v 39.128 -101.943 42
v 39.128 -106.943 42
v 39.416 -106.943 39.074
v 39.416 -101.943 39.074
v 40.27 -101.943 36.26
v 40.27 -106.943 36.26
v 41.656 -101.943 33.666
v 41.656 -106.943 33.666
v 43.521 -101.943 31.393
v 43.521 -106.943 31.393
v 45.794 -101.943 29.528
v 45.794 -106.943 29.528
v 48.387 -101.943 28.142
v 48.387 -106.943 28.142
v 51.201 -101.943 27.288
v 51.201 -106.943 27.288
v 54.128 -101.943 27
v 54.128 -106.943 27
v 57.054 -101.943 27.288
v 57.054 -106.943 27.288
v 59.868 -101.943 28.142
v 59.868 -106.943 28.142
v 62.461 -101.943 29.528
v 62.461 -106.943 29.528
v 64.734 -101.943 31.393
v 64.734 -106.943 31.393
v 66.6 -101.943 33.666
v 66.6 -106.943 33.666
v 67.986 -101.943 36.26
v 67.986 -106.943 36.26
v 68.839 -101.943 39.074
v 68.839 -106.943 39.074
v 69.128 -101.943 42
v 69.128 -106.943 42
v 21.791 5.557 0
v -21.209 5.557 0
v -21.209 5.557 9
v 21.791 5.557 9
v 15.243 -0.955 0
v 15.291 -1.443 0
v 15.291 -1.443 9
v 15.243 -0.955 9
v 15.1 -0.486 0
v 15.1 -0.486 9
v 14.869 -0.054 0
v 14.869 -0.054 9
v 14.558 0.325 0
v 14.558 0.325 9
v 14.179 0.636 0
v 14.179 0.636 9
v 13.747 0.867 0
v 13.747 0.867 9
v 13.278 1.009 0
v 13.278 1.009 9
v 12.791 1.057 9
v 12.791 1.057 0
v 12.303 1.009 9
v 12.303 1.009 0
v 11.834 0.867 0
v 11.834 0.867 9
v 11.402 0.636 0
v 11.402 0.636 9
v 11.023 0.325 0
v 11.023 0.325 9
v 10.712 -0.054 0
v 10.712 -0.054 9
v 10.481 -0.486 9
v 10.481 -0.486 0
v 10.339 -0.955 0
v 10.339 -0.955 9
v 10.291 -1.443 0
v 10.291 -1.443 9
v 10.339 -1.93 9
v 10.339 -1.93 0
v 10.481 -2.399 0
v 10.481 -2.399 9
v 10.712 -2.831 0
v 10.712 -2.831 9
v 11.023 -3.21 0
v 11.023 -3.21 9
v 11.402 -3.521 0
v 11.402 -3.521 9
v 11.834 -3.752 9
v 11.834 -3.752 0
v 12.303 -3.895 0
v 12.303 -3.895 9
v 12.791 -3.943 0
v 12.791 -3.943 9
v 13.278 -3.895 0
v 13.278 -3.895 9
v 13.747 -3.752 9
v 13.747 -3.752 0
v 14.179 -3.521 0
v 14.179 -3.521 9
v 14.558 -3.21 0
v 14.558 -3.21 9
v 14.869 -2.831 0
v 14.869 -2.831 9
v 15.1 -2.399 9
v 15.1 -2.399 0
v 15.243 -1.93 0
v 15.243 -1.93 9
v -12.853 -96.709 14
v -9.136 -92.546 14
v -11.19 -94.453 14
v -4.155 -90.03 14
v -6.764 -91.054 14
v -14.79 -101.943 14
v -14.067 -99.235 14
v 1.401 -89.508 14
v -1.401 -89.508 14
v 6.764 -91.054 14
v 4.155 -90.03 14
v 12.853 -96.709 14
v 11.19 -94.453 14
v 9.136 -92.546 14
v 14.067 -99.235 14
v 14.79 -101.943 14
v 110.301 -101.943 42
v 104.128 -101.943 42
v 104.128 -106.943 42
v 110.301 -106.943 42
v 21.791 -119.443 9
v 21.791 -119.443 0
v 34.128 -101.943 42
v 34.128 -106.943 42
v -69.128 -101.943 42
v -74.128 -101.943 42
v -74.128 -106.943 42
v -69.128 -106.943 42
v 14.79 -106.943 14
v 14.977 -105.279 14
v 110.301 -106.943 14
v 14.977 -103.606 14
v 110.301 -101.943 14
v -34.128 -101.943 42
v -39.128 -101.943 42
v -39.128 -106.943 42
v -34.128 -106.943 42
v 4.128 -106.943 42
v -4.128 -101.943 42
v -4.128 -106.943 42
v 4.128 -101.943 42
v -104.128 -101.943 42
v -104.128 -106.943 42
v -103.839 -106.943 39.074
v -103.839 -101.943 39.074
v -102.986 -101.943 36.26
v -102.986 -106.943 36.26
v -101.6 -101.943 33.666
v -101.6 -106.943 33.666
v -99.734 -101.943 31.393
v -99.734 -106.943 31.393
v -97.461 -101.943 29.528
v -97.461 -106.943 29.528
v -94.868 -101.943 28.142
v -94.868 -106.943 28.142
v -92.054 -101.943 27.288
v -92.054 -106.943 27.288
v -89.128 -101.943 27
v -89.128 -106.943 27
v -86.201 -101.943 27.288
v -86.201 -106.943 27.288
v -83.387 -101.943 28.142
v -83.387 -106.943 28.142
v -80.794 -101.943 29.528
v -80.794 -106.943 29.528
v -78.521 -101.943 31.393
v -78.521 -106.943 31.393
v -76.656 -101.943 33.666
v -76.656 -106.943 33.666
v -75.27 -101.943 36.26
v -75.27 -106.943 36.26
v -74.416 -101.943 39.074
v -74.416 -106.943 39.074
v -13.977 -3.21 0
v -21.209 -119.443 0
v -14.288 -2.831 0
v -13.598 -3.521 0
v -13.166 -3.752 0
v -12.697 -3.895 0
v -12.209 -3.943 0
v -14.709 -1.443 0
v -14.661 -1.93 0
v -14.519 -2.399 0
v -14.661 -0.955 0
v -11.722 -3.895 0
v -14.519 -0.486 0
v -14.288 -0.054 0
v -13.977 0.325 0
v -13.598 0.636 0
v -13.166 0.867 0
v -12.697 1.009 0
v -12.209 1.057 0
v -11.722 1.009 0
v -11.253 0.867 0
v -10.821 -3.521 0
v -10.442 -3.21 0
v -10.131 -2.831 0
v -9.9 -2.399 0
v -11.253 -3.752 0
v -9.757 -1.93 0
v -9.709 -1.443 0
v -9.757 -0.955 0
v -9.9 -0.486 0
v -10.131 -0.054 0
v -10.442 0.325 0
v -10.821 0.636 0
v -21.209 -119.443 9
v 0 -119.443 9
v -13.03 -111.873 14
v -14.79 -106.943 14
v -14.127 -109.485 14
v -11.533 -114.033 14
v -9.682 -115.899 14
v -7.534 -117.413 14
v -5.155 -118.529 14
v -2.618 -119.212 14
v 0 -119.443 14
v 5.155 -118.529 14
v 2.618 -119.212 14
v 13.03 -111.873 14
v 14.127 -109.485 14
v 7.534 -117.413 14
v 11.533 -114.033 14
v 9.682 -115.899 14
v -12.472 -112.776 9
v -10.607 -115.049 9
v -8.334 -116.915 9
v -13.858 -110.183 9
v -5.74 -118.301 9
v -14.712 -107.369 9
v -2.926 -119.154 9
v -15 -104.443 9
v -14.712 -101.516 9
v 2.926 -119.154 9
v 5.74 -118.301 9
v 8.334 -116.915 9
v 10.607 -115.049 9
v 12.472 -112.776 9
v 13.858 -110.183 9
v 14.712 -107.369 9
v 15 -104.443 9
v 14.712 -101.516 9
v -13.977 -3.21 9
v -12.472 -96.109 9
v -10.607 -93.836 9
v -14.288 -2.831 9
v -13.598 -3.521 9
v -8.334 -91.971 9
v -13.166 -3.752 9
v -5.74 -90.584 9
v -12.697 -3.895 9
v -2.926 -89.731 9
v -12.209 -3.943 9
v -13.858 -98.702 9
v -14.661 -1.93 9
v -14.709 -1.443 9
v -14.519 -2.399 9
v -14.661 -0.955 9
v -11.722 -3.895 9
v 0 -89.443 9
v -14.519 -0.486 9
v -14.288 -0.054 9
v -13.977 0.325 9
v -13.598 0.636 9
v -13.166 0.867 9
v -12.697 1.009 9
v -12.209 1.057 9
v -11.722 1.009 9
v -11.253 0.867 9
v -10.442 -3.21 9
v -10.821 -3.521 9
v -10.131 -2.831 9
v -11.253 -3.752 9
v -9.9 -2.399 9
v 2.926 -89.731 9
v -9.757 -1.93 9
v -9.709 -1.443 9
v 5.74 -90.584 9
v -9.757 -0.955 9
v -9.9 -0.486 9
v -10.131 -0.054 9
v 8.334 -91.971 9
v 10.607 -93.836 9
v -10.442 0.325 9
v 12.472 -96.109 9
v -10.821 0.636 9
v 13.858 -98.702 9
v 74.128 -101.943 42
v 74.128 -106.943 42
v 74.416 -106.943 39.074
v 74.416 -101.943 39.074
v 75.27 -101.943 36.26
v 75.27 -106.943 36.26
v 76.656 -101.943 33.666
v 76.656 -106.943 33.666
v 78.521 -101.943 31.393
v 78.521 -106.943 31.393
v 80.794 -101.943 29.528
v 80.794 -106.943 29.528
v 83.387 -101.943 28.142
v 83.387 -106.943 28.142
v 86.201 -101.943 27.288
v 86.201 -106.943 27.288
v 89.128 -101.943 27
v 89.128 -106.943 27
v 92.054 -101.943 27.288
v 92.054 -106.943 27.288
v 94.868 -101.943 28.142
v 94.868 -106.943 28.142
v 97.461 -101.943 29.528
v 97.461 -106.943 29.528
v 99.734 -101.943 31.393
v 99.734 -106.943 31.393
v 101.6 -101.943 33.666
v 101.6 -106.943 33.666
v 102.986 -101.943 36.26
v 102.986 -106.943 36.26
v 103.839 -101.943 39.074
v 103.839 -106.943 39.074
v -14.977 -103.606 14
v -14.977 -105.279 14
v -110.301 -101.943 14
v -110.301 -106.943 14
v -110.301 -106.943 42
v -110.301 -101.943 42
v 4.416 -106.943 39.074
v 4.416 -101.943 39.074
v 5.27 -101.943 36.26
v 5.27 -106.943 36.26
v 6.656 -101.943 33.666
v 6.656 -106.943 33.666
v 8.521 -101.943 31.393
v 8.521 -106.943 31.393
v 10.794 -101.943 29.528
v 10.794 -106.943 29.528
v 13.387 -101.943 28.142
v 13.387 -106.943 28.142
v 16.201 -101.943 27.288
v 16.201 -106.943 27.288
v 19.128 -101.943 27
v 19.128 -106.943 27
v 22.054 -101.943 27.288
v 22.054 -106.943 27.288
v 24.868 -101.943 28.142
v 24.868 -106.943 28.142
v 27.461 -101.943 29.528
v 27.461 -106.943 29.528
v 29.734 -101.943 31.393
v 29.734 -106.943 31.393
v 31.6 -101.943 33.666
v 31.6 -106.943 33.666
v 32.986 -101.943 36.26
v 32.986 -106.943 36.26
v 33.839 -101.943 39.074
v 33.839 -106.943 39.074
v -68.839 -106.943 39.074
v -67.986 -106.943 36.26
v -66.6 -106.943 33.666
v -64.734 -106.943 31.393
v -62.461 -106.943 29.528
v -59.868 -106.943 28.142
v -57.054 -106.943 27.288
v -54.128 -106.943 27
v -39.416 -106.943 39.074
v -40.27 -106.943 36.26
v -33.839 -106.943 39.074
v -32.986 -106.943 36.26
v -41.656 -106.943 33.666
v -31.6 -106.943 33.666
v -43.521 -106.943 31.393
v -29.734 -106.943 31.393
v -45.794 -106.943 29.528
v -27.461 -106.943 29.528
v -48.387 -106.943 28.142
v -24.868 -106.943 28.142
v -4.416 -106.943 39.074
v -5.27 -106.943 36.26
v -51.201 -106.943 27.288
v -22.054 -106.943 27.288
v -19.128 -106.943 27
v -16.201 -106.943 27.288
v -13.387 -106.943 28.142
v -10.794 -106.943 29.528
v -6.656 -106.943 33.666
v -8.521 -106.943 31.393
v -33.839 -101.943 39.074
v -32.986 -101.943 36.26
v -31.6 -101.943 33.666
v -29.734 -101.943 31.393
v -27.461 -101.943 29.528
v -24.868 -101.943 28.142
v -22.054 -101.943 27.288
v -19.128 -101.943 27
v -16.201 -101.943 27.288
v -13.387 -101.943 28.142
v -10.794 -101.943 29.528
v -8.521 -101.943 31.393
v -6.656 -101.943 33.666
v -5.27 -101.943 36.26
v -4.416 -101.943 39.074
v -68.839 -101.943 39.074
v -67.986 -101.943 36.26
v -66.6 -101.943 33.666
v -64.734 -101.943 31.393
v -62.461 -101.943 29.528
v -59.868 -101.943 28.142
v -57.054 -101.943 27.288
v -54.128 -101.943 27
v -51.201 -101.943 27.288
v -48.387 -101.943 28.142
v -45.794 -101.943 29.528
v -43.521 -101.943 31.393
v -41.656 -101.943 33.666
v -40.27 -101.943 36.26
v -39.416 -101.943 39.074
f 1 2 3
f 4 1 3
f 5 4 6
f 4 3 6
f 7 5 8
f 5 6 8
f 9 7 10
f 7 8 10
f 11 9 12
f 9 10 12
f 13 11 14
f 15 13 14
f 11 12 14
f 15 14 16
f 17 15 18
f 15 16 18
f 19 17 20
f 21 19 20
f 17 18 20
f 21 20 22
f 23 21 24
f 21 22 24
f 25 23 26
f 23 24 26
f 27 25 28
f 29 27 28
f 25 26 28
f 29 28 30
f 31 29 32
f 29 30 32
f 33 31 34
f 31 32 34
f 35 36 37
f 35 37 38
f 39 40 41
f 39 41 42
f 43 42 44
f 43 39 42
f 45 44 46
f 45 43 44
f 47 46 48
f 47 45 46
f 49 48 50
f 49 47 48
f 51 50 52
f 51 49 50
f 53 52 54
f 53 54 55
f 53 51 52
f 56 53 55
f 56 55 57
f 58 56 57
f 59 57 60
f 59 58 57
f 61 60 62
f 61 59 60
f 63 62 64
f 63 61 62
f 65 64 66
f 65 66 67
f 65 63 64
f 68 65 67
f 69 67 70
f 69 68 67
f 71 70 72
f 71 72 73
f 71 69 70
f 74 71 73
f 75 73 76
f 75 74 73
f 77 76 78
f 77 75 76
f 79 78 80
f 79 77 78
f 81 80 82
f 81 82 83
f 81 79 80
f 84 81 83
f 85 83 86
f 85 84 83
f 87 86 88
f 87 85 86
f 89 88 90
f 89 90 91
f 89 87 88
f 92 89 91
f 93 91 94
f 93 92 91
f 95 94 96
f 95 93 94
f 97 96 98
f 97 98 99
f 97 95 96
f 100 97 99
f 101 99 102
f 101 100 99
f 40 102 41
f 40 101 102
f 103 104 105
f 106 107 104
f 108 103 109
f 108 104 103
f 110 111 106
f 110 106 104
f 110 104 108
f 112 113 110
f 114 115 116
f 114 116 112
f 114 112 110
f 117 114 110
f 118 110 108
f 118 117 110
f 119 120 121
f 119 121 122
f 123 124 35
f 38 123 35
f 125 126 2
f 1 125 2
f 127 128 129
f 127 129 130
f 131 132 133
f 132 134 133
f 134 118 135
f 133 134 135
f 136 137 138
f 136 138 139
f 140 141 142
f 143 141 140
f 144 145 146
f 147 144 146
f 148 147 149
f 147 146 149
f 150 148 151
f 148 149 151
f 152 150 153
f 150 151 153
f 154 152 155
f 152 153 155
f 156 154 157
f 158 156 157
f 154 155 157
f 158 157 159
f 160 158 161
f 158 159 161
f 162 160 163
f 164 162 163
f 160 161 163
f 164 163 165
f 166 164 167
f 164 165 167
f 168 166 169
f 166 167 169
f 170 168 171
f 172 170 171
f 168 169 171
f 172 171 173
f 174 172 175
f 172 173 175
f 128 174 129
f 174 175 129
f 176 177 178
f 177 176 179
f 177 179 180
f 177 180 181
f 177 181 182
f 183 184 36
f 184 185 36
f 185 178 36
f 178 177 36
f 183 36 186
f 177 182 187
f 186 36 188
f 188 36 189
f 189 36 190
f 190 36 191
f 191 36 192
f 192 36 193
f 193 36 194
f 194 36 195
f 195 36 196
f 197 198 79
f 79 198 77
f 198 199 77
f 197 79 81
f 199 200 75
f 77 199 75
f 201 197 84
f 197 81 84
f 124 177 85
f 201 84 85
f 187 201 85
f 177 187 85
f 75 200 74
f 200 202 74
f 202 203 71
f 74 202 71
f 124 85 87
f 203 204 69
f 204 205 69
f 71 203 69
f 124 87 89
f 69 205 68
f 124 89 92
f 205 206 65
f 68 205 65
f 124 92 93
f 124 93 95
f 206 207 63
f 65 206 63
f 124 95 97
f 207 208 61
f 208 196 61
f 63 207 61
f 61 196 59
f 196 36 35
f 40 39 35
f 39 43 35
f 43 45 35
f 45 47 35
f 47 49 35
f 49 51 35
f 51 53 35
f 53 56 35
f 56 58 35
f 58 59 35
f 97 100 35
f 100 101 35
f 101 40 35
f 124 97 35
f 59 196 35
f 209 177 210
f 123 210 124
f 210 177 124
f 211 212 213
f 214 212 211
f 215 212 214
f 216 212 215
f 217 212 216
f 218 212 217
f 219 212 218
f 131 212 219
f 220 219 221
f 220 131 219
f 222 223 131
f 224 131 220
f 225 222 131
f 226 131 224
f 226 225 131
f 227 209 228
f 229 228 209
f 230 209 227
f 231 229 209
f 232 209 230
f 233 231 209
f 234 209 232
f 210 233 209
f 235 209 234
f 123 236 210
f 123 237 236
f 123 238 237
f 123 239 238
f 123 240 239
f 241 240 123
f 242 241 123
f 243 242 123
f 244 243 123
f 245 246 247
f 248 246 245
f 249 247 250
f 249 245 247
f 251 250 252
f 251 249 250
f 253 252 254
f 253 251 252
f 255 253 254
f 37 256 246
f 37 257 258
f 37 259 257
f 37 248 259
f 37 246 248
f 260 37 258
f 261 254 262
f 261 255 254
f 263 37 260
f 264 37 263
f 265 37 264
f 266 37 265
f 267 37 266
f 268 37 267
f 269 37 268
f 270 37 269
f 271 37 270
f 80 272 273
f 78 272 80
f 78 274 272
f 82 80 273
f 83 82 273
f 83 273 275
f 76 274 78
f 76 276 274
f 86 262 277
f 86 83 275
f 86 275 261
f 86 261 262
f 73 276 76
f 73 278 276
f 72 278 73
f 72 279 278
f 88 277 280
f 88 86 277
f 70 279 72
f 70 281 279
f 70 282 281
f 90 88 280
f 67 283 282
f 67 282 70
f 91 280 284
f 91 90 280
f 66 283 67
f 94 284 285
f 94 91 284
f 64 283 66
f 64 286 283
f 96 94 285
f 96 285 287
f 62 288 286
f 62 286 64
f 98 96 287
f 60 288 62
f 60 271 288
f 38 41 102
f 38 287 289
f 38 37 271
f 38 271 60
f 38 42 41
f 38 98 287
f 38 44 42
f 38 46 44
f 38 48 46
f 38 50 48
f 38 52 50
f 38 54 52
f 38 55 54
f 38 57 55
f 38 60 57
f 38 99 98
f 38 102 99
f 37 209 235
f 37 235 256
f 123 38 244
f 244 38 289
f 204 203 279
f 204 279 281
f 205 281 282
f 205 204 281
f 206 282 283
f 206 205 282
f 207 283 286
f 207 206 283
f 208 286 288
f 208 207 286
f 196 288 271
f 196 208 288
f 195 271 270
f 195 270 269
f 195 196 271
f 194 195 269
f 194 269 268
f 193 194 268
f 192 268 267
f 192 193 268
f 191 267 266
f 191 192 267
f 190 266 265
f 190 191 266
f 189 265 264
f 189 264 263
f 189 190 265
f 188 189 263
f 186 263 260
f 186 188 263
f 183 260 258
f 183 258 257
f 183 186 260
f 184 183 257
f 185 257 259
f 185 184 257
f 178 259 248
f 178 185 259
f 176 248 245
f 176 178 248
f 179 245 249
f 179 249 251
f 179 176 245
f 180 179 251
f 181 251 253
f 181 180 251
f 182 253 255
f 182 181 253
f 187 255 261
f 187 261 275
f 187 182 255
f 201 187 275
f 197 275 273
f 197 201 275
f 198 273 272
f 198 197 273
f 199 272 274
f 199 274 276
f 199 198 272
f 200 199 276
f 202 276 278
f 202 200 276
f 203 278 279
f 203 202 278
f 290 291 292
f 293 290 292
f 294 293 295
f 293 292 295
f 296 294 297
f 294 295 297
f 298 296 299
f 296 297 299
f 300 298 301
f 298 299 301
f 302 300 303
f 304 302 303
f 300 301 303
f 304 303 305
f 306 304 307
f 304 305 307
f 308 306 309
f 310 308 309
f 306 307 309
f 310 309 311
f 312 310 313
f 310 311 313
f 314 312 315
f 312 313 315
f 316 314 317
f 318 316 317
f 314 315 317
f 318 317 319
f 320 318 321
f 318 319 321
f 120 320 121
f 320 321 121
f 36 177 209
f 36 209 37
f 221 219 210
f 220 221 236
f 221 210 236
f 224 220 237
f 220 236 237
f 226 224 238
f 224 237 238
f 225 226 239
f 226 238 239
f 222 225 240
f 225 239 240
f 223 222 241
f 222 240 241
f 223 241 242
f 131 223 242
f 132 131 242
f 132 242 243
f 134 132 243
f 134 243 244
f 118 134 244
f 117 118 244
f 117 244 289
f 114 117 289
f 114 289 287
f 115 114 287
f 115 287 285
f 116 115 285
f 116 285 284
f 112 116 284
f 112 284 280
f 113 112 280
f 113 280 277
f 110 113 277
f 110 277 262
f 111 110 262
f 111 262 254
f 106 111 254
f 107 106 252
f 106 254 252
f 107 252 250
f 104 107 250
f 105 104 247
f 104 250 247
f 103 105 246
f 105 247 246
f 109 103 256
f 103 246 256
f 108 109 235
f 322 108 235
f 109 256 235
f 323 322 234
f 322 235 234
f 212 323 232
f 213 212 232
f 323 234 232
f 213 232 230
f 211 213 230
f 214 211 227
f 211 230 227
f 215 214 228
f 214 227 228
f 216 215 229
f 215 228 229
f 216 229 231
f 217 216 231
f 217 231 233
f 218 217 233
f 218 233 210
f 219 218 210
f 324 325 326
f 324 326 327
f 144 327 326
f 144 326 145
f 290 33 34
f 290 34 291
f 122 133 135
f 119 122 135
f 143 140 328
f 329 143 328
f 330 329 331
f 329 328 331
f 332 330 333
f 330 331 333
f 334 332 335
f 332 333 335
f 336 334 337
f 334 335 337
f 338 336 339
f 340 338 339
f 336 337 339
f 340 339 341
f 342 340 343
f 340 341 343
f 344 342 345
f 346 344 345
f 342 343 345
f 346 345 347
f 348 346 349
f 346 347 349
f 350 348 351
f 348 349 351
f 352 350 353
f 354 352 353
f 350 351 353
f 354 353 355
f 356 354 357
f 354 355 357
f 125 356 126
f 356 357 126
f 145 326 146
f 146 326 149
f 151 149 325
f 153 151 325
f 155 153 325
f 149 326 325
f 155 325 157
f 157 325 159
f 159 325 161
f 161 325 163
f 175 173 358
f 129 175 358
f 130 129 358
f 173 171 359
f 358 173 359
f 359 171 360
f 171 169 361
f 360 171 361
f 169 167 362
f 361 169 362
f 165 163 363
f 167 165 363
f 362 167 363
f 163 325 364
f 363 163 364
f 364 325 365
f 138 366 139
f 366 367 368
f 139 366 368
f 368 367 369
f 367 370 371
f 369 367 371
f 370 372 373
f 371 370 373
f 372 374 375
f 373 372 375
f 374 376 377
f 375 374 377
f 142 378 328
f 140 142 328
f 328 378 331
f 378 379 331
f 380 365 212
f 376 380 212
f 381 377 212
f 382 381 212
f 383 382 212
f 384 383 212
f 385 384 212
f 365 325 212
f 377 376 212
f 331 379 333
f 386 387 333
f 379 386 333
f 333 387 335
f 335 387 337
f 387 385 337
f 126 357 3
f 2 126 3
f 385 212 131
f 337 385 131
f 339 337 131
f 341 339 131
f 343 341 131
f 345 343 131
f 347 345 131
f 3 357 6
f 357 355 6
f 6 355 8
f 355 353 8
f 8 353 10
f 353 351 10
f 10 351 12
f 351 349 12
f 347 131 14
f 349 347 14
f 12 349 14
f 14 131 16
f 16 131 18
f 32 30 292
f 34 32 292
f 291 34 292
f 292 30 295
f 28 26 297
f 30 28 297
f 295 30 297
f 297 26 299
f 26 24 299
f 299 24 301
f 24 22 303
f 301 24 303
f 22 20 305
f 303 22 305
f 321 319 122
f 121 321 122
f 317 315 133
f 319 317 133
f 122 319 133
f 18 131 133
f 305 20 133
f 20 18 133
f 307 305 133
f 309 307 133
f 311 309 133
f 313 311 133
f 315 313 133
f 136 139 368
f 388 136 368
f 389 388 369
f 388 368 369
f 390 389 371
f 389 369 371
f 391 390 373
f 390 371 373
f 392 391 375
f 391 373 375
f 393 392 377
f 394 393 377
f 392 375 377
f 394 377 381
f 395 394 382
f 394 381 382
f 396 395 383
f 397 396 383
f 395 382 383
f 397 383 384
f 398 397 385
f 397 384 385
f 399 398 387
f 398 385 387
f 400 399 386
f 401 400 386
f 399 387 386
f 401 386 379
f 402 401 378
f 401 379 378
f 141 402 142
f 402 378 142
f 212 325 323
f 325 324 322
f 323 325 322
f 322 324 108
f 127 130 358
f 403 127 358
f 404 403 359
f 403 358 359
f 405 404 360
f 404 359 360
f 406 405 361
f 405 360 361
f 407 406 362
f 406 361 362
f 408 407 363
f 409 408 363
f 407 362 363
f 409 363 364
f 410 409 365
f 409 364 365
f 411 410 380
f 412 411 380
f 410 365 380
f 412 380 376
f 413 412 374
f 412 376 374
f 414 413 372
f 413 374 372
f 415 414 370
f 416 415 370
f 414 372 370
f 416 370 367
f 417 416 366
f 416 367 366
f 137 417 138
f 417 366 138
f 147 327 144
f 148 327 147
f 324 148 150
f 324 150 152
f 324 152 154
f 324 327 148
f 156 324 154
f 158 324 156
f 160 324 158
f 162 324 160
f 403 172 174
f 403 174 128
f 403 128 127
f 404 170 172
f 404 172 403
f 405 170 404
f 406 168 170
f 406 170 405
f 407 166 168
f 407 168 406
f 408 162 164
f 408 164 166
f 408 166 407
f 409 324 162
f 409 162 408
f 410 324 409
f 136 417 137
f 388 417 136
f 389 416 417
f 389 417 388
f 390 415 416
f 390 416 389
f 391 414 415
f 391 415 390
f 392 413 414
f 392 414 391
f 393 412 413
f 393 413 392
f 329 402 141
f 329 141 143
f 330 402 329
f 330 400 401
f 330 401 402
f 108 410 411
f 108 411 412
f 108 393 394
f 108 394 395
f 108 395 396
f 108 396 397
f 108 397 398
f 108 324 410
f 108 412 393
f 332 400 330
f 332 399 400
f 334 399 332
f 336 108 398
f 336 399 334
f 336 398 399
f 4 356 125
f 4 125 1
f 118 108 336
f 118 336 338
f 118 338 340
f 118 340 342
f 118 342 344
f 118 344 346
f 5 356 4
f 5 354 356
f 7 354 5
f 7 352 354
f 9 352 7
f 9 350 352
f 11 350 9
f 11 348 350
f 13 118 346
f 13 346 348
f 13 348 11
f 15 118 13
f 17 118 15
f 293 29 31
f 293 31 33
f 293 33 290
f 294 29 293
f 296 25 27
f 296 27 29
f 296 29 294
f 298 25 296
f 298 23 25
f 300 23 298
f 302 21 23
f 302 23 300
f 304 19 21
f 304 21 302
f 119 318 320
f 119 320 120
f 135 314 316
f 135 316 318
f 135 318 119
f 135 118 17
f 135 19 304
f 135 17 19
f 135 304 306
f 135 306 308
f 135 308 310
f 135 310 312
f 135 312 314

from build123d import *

# Parameters (mm, degrees)
SKETCH_1_W          = 43
SKETCH_1_H          = 110
SKETCH_1_W_2        = 21.5
SKETCH_1_H_2        = 15
SKETCH_1_R          = 2.5
EXTRUDE_1_DEPTH     = 9
SKETCH_4_R          = 15
EXTRUDE_2_DEPTH     = 5
SKETCH_5_W          = 220.601907976
SKETCH_5_H          = 5
EXTRUDE_3_DEPTH     = 28
SKETCH_6_R          = 15
CUT_EXTRUDE_1_DEPTH = 28


with BuildPart() as part:
    # 草图1 → 凸台-拉伸1 (new body)
    # profile 1 of 3: a face of its own
    with BuildSketch(Plane.XY):
        with Locations((0.290540541, -64.442567568)):
            Rectangle(SKETCH_1_W, SKETCH_1_H)
    # profile 2 of 3: a face of its own
    with BuildSketch(Plane.XY):
        with Locations((11.040540541, -1.942567568)):
            Rectangle(SKETCH_1_W_2, SKETCH_1_H_2)
        with Locations((12.790540541, -1.442567568)):
            Circle(SKETCH_1_R, mode=Mode.SUBTRACT)
    # profile 3 of 3: a face of its own
    with BuildSketch(Plane.XY):
        with Locations((-10.459459459, -1.942567568)):
            Rectangle(SKETCH_1_W_2, SKETCH_1_H_2)
        with Locations((-12.209459459, -1.442567568)):
            Circle(SKETCH_1_R, mode=Mode.SUBTRACT)
    extrude(amount=EXTRUDE_1_DEPTH)

    # 草图4 → 凸台-拉伸2 (add)
    with BuildSketch(Plane.XY.offset(9)):
        with Locations(Location((0, -104.442567568, 0), (0, 0, 270))):
            Circle(SKETCH_4_R)
    extrude(amount=EXTRUDE_2_DEPTH)

    # 草图5 → 凸台-拉伸3 (add)
    with BuildSketch(Plane.XY.offset(14)):
        with Locations((0, -104.442567568)):
            Rectangle(SKETCH_5_W, SKETCH_5_H)
    extrude(amount=EXTRUDE_3_DEPTH)

    # 草图6 → 切除-拉伸1 (cut)
    with BuildSketch(Plane(origin=(0, -106.942567568, 0), x_dir=(-1, 0, 0), z_dir=(0, -1, 0))):
        with Locations((-19.127702363, -42)):
            Circle(SKETCH_6_R)
        with Locations((-54.127702363, -42)):
            Circle(SKETCH_6_R)
        with Locations((-89.127702363, -42)):
            Circle(SKETCH_6_R)
        with Locations((19.127702363, -42)):
            Circle(SKETCH_6_R)
        with Locations((54.127702363, -42)):
            Circle(SKETCH_6_R)
        with Locations((89.127702363, -42)):
            Circle(SKETCH_6_R)
    extrude(amount=-CUT_EXTRUDE_1_DEPTH, mode=Mode.SUBTRACT)


solid = part.part
